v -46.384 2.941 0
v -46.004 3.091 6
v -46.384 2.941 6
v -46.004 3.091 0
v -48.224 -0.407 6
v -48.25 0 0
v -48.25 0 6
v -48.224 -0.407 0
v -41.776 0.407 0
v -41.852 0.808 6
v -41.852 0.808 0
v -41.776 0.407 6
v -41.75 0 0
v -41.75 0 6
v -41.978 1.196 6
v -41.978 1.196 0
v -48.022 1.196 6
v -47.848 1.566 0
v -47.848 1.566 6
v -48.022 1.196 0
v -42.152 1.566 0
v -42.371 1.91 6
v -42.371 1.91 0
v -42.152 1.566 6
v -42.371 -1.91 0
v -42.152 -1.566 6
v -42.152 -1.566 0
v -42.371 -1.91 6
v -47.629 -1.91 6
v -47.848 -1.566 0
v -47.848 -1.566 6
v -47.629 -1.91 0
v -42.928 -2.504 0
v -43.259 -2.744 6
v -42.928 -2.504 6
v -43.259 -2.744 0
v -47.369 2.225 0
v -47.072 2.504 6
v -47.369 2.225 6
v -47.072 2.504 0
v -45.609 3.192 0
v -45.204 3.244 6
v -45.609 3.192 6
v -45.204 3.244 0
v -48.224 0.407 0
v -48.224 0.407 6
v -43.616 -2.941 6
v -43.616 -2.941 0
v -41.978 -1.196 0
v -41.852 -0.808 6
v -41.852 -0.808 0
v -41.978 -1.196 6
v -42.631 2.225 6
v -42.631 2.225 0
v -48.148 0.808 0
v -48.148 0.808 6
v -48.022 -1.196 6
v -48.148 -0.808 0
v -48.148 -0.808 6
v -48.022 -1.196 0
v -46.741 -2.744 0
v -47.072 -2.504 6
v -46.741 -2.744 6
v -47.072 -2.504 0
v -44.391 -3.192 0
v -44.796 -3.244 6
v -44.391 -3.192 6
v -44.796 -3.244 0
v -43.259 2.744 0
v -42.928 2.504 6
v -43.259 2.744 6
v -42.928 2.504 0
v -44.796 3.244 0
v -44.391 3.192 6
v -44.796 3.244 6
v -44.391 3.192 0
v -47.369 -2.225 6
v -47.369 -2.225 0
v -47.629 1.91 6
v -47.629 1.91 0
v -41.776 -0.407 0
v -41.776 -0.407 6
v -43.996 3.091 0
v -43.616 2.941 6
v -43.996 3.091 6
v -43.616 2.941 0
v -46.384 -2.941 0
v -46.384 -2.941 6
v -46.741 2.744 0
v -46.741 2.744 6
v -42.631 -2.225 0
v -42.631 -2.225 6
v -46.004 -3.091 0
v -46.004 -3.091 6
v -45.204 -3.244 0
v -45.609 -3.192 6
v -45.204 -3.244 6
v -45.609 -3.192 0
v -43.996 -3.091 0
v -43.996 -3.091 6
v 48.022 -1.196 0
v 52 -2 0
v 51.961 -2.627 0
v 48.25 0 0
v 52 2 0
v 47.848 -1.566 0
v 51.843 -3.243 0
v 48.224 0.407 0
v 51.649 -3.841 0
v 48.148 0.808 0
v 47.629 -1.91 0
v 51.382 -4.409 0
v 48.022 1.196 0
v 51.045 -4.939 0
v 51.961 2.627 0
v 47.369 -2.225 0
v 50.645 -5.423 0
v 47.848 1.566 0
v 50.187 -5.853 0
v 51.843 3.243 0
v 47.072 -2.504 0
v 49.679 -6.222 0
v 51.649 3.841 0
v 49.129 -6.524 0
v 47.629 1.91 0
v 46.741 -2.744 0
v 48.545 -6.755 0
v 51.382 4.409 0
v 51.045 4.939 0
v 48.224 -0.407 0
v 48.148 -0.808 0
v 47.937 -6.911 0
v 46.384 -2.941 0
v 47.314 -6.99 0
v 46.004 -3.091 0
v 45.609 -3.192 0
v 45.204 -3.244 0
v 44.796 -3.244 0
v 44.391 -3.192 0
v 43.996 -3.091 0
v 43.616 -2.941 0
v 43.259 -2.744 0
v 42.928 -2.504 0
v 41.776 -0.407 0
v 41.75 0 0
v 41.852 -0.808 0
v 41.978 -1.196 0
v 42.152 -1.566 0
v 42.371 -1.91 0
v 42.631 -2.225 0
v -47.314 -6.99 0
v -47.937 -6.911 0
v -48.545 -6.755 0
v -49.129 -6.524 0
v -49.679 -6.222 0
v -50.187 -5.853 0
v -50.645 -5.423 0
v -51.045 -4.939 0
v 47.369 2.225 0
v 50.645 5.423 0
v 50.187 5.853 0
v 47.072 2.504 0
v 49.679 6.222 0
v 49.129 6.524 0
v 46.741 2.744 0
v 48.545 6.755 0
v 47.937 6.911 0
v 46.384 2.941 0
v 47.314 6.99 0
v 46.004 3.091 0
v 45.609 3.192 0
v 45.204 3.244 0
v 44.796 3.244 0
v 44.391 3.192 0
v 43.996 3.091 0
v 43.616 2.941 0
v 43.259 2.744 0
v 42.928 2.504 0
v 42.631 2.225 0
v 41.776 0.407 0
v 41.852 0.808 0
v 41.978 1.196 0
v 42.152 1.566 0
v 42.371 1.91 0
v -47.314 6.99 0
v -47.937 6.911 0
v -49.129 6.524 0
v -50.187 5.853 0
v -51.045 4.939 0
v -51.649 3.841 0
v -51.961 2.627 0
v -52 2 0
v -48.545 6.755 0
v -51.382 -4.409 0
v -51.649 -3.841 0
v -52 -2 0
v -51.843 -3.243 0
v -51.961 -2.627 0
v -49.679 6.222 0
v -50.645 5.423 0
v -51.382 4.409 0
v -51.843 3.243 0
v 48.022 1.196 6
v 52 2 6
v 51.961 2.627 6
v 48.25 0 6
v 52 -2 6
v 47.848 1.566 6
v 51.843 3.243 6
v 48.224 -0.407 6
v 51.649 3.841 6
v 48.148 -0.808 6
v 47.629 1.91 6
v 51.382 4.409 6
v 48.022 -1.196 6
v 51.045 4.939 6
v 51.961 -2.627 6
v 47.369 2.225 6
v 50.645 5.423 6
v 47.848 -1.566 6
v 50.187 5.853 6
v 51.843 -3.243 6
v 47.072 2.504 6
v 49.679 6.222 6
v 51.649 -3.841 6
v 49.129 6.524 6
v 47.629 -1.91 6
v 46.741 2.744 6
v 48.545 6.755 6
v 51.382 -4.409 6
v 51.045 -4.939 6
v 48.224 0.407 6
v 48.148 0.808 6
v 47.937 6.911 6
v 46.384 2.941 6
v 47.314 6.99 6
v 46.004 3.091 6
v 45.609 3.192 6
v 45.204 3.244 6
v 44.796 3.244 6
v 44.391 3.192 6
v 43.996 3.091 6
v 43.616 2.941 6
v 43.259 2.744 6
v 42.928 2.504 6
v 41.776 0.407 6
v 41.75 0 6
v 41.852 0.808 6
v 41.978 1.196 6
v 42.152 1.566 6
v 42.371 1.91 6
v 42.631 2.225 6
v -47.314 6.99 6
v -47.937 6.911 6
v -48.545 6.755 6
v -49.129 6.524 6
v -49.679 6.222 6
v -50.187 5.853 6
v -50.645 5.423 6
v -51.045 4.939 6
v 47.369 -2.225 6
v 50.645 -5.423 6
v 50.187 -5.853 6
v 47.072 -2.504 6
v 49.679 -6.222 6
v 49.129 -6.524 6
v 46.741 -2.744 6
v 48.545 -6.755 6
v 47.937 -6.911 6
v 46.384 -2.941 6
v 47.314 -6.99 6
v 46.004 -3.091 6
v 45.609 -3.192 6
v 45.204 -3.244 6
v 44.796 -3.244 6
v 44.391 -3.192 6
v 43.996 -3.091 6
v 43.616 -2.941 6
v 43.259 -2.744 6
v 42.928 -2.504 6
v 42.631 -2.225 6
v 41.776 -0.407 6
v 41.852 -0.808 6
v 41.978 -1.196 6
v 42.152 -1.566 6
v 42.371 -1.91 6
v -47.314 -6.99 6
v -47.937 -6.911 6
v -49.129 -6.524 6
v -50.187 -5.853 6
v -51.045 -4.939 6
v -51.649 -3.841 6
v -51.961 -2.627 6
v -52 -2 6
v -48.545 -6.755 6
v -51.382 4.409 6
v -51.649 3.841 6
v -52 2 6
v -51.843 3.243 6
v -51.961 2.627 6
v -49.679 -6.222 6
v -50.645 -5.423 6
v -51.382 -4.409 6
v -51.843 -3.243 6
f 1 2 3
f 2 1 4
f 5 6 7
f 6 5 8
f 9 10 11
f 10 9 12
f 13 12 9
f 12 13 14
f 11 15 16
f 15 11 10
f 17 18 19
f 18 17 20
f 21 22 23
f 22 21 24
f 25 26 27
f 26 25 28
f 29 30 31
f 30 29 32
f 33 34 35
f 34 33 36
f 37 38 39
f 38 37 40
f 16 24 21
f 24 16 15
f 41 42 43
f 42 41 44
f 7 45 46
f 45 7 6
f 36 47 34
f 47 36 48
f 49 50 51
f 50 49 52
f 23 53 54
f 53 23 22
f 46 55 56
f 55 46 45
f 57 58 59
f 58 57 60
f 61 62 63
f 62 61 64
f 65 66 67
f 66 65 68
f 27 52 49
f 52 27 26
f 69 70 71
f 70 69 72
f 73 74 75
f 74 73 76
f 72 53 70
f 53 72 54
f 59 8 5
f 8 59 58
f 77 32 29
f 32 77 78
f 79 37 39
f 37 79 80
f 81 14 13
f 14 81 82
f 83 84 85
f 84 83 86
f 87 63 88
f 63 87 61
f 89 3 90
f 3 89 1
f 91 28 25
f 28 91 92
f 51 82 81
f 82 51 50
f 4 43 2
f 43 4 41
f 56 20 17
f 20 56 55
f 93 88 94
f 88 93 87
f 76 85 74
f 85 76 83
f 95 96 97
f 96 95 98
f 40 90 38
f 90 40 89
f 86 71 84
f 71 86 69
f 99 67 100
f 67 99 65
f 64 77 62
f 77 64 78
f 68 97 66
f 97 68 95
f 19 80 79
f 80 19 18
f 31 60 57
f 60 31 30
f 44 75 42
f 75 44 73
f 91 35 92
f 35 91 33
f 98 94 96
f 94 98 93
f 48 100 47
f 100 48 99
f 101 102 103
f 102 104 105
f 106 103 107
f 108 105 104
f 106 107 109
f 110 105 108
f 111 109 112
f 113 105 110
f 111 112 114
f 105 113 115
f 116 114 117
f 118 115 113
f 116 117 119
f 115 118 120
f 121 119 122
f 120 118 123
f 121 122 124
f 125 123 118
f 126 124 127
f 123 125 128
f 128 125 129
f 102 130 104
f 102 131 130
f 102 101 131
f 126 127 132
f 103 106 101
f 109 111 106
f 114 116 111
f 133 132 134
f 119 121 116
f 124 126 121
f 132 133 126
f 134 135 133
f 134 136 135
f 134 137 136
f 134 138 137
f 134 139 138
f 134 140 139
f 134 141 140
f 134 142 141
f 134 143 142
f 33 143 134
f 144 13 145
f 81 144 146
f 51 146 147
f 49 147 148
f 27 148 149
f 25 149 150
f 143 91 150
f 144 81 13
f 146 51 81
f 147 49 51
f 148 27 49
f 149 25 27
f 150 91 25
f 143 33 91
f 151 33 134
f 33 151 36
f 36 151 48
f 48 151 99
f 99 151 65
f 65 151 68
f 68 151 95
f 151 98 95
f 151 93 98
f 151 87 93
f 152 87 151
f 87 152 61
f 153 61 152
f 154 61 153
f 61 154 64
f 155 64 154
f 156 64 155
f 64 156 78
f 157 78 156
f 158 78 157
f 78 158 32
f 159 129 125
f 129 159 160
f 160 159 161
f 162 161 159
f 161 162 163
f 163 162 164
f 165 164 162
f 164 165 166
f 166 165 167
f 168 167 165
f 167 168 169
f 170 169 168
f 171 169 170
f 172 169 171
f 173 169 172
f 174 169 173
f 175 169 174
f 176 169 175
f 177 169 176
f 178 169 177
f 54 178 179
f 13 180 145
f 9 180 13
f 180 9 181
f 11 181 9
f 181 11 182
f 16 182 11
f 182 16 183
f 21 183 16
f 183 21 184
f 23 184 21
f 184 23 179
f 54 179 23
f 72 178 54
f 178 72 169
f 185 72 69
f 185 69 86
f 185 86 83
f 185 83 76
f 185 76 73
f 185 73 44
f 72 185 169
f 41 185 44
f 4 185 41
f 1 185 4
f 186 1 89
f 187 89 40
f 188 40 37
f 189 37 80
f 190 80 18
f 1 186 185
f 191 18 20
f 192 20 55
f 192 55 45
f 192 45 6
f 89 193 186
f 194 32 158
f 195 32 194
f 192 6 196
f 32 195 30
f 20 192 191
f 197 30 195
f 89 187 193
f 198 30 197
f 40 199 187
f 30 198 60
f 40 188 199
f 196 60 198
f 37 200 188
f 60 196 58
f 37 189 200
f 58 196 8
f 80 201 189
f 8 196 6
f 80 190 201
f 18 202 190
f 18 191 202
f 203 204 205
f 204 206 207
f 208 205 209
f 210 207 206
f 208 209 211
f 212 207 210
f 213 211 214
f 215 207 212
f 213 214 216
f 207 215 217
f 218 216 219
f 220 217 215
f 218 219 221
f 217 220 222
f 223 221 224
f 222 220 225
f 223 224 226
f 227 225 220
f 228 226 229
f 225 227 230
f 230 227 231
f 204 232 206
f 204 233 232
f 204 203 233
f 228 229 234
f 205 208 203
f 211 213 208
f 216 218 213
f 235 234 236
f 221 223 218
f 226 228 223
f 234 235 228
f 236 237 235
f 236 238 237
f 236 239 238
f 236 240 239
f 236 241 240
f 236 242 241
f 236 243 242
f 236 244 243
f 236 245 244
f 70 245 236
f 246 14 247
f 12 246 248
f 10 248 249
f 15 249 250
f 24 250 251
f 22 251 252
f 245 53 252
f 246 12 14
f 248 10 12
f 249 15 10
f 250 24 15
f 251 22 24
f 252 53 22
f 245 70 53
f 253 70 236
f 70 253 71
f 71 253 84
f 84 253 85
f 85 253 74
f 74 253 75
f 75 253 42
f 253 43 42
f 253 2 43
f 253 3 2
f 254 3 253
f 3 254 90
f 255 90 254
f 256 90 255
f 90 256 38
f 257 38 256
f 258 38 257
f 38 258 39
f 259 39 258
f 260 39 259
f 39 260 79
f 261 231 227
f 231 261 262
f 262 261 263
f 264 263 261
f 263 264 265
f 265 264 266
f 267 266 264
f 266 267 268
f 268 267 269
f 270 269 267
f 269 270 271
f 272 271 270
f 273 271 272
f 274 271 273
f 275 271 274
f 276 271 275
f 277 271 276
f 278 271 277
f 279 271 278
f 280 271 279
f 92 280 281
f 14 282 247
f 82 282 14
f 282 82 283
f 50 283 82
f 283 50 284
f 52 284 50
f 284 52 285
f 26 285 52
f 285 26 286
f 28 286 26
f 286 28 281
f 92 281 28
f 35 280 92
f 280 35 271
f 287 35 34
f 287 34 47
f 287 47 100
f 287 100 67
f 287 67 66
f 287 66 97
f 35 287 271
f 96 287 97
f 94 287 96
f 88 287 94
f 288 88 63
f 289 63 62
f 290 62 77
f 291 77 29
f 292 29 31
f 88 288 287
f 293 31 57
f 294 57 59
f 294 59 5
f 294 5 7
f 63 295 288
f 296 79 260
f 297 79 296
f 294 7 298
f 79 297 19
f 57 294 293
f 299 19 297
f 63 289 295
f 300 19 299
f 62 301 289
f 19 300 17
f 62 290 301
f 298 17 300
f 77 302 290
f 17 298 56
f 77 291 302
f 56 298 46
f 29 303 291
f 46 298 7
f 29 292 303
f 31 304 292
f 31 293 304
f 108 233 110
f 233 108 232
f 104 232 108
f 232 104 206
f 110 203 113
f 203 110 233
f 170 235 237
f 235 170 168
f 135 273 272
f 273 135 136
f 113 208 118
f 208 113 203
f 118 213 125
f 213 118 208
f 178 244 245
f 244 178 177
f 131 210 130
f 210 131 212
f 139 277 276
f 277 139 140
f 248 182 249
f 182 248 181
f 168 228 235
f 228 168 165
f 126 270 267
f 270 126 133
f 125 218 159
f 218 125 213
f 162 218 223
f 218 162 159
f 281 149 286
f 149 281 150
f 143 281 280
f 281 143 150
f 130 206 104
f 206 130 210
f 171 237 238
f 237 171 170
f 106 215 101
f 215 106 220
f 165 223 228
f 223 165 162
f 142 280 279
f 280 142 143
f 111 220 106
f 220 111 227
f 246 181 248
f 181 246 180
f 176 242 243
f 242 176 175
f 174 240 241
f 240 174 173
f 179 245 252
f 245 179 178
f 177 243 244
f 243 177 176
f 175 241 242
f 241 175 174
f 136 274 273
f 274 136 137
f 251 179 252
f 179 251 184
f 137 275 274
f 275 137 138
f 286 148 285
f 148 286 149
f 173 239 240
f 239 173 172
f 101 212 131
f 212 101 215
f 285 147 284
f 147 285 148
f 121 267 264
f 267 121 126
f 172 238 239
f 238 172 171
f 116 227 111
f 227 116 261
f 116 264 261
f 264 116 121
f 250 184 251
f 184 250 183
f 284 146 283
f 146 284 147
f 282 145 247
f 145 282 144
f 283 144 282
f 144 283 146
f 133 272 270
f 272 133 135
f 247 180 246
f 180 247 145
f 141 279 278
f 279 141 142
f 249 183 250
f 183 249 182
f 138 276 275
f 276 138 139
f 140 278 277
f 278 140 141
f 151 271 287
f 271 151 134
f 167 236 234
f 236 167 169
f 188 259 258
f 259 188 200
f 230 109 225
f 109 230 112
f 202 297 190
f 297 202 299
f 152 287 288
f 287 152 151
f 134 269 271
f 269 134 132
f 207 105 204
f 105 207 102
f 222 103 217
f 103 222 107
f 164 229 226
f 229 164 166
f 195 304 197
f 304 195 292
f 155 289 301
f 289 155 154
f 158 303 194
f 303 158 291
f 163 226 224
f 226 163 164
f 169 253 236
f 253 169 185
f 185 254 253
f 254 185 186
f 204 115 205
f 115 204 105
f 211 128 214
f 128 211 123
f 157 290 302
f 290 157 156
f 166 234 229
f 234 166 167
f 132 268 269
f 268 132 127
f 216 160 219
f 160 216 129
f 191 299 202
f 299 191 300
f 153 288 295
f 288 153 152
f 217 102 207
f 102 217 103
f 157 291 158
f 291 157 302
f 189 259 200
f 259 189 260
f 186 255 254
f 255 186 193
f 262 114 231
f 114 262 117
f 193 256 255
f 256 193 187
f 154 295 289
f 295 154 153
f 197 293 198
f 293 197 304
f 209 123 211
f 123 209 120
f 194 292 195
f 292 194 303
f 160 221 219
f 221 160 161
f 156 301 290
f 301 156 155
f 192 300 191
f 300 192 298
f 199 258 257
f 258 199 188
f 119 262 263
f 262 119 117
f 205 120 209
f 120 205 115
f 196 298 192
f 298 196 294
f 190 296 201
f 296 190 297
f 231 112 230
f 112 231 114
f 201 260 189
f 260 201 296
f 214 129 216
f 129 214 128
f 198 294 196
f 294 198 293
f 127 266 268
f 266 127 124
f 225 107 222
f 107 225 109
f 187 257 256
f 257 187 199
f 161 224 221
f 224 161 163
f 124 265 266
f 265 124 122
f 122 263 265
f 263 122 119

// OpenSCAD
$fn = 50;


difference() {
	union() {
		hull() {
			translate(v = [-47.0000000000, 2.0000000000, 0]) {
				cylinder(h = 6, r = 5);
			}
			translate(v = [47.0000000000, 2.0000000000, 0]) {
				cylinder(h = 6, r = 5);
			}
			translate(v = [-47.0000000000, -2.0000000000, 0]) {
				cylinder(h = 6, r = 5);
			}
			translate(v = [47.0000000000, -2.0000000000, 0]) {
				cylinder(h = 6, r = 5);
			}
		}
	}
	union() {
		translate(v = [-45.0000000000, 0.0000000000, 0]) {
			cylinder(h = 6, r = 3.2500000000);
		}
		translate(v = [45.0000000000, 0.0000000000, 0]) {
			cylinder(h = 6, r = 3.2500000000);
		}
		translate(v = [-45.0000000000, 0.0000000000, 0]) {
			cylinder(h = 6, r = 1.8000000000);
		}
		translate(v = [45.0000000000, 0.0000000000, 0]) {
			cylinder(h = 6, r = 1.8000000000);
		}
		translate(v = [-45.0000000000, 0.0000000000, 0]) {
			cylinder(h = 6, r = 1.8000000000);
		}
		translate(v = [45.0000000000, 0.0000000000, 0]) {
			cylinder(h = 6, r = 1.8000000000);
		}
		translate(v = [-45.0000000000, 0.0000000000, 0]) {
			cylinder(h = 6, r = 1.8000000000);
		}
		translate(v = [45.0000000000, 0.0000000000, 0]) {
			cylinder(h = 6, r = 1.8000000000);
		}
	}
}
